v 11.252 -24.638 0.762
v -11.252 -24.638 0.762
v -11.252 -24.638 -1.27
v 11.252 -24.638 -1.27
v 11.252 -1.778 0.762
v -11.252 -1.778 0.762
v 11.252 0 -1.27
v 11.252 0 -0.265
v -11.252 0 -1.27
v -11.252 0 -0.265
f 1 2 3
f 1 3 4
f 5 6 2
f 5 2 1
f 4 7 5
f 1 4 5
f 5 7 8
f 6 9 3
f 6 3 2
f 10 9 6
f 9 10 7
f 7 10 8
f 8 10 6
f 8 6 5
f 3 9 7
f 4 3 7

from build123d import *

# Parameters (mm, degrees)
F0_W     = 22.86
F0_H     = 2.54
F1_DEPTH = 24.638
F2_SIZE2 = 1.0265287786
F2_SIZE  = 1.778
F3_DEPTH = 0.508
F4_DEPTH = 0.1778
F5_DEPTH = 0.1778


with BuildPart() as f1:
    # F0 (on Front) → F1 (new body)
    with BuildSketch(Plane.XZ):
        Rectangle(F0_W, F0_H)
    extrude(amount=F1_DEPTH)

    # F2
    f2_edges = [f1.edges().sort_by_distance(p)[0] for p in [
        (0, 0, 1.27),
    ]]
    f2_side = f1.faces().sort_by_distance((0, -12.319, 1.27))[0]
    chamfer(f2_edges, length=F2_SIZE, length2=F2_SIZE2, reference=f2_side)

    # F3 (cut): faces of the model
    f3_faces = [f1.faces().sort_by_distance(p)[0] for p in [
        (0, -13.208, 1.27),
        (0, -0.889, 0.7567356107),
    ]]
    extrude(f3_faces, amount=-F3_DEPTH, dir=(0, 0, 1), mode=Mode.SUBTRACT)

    # F4 (cut): a face of the model
    f4_faces = [f1.faces().sort_by_distance(p)[0] for p in [
        (-11.43, -12.5367185417, -0.2665106389),
    ]]
    extrude(f4_faces, amount=-F4_DEPTH, mode=Mode.SUBTRACT)

    # F5 (cut): a face of the model
    f5_faces = [f1.faces().sort_by_distance(p)[0] for p in [
        (11.43, -12.5367185417, -0.2665106389),
    ]]
    extrude(f5_faces, amount=-F5_DEPTH, mode=Mode.SUBTRACT)


solid = f1.part
